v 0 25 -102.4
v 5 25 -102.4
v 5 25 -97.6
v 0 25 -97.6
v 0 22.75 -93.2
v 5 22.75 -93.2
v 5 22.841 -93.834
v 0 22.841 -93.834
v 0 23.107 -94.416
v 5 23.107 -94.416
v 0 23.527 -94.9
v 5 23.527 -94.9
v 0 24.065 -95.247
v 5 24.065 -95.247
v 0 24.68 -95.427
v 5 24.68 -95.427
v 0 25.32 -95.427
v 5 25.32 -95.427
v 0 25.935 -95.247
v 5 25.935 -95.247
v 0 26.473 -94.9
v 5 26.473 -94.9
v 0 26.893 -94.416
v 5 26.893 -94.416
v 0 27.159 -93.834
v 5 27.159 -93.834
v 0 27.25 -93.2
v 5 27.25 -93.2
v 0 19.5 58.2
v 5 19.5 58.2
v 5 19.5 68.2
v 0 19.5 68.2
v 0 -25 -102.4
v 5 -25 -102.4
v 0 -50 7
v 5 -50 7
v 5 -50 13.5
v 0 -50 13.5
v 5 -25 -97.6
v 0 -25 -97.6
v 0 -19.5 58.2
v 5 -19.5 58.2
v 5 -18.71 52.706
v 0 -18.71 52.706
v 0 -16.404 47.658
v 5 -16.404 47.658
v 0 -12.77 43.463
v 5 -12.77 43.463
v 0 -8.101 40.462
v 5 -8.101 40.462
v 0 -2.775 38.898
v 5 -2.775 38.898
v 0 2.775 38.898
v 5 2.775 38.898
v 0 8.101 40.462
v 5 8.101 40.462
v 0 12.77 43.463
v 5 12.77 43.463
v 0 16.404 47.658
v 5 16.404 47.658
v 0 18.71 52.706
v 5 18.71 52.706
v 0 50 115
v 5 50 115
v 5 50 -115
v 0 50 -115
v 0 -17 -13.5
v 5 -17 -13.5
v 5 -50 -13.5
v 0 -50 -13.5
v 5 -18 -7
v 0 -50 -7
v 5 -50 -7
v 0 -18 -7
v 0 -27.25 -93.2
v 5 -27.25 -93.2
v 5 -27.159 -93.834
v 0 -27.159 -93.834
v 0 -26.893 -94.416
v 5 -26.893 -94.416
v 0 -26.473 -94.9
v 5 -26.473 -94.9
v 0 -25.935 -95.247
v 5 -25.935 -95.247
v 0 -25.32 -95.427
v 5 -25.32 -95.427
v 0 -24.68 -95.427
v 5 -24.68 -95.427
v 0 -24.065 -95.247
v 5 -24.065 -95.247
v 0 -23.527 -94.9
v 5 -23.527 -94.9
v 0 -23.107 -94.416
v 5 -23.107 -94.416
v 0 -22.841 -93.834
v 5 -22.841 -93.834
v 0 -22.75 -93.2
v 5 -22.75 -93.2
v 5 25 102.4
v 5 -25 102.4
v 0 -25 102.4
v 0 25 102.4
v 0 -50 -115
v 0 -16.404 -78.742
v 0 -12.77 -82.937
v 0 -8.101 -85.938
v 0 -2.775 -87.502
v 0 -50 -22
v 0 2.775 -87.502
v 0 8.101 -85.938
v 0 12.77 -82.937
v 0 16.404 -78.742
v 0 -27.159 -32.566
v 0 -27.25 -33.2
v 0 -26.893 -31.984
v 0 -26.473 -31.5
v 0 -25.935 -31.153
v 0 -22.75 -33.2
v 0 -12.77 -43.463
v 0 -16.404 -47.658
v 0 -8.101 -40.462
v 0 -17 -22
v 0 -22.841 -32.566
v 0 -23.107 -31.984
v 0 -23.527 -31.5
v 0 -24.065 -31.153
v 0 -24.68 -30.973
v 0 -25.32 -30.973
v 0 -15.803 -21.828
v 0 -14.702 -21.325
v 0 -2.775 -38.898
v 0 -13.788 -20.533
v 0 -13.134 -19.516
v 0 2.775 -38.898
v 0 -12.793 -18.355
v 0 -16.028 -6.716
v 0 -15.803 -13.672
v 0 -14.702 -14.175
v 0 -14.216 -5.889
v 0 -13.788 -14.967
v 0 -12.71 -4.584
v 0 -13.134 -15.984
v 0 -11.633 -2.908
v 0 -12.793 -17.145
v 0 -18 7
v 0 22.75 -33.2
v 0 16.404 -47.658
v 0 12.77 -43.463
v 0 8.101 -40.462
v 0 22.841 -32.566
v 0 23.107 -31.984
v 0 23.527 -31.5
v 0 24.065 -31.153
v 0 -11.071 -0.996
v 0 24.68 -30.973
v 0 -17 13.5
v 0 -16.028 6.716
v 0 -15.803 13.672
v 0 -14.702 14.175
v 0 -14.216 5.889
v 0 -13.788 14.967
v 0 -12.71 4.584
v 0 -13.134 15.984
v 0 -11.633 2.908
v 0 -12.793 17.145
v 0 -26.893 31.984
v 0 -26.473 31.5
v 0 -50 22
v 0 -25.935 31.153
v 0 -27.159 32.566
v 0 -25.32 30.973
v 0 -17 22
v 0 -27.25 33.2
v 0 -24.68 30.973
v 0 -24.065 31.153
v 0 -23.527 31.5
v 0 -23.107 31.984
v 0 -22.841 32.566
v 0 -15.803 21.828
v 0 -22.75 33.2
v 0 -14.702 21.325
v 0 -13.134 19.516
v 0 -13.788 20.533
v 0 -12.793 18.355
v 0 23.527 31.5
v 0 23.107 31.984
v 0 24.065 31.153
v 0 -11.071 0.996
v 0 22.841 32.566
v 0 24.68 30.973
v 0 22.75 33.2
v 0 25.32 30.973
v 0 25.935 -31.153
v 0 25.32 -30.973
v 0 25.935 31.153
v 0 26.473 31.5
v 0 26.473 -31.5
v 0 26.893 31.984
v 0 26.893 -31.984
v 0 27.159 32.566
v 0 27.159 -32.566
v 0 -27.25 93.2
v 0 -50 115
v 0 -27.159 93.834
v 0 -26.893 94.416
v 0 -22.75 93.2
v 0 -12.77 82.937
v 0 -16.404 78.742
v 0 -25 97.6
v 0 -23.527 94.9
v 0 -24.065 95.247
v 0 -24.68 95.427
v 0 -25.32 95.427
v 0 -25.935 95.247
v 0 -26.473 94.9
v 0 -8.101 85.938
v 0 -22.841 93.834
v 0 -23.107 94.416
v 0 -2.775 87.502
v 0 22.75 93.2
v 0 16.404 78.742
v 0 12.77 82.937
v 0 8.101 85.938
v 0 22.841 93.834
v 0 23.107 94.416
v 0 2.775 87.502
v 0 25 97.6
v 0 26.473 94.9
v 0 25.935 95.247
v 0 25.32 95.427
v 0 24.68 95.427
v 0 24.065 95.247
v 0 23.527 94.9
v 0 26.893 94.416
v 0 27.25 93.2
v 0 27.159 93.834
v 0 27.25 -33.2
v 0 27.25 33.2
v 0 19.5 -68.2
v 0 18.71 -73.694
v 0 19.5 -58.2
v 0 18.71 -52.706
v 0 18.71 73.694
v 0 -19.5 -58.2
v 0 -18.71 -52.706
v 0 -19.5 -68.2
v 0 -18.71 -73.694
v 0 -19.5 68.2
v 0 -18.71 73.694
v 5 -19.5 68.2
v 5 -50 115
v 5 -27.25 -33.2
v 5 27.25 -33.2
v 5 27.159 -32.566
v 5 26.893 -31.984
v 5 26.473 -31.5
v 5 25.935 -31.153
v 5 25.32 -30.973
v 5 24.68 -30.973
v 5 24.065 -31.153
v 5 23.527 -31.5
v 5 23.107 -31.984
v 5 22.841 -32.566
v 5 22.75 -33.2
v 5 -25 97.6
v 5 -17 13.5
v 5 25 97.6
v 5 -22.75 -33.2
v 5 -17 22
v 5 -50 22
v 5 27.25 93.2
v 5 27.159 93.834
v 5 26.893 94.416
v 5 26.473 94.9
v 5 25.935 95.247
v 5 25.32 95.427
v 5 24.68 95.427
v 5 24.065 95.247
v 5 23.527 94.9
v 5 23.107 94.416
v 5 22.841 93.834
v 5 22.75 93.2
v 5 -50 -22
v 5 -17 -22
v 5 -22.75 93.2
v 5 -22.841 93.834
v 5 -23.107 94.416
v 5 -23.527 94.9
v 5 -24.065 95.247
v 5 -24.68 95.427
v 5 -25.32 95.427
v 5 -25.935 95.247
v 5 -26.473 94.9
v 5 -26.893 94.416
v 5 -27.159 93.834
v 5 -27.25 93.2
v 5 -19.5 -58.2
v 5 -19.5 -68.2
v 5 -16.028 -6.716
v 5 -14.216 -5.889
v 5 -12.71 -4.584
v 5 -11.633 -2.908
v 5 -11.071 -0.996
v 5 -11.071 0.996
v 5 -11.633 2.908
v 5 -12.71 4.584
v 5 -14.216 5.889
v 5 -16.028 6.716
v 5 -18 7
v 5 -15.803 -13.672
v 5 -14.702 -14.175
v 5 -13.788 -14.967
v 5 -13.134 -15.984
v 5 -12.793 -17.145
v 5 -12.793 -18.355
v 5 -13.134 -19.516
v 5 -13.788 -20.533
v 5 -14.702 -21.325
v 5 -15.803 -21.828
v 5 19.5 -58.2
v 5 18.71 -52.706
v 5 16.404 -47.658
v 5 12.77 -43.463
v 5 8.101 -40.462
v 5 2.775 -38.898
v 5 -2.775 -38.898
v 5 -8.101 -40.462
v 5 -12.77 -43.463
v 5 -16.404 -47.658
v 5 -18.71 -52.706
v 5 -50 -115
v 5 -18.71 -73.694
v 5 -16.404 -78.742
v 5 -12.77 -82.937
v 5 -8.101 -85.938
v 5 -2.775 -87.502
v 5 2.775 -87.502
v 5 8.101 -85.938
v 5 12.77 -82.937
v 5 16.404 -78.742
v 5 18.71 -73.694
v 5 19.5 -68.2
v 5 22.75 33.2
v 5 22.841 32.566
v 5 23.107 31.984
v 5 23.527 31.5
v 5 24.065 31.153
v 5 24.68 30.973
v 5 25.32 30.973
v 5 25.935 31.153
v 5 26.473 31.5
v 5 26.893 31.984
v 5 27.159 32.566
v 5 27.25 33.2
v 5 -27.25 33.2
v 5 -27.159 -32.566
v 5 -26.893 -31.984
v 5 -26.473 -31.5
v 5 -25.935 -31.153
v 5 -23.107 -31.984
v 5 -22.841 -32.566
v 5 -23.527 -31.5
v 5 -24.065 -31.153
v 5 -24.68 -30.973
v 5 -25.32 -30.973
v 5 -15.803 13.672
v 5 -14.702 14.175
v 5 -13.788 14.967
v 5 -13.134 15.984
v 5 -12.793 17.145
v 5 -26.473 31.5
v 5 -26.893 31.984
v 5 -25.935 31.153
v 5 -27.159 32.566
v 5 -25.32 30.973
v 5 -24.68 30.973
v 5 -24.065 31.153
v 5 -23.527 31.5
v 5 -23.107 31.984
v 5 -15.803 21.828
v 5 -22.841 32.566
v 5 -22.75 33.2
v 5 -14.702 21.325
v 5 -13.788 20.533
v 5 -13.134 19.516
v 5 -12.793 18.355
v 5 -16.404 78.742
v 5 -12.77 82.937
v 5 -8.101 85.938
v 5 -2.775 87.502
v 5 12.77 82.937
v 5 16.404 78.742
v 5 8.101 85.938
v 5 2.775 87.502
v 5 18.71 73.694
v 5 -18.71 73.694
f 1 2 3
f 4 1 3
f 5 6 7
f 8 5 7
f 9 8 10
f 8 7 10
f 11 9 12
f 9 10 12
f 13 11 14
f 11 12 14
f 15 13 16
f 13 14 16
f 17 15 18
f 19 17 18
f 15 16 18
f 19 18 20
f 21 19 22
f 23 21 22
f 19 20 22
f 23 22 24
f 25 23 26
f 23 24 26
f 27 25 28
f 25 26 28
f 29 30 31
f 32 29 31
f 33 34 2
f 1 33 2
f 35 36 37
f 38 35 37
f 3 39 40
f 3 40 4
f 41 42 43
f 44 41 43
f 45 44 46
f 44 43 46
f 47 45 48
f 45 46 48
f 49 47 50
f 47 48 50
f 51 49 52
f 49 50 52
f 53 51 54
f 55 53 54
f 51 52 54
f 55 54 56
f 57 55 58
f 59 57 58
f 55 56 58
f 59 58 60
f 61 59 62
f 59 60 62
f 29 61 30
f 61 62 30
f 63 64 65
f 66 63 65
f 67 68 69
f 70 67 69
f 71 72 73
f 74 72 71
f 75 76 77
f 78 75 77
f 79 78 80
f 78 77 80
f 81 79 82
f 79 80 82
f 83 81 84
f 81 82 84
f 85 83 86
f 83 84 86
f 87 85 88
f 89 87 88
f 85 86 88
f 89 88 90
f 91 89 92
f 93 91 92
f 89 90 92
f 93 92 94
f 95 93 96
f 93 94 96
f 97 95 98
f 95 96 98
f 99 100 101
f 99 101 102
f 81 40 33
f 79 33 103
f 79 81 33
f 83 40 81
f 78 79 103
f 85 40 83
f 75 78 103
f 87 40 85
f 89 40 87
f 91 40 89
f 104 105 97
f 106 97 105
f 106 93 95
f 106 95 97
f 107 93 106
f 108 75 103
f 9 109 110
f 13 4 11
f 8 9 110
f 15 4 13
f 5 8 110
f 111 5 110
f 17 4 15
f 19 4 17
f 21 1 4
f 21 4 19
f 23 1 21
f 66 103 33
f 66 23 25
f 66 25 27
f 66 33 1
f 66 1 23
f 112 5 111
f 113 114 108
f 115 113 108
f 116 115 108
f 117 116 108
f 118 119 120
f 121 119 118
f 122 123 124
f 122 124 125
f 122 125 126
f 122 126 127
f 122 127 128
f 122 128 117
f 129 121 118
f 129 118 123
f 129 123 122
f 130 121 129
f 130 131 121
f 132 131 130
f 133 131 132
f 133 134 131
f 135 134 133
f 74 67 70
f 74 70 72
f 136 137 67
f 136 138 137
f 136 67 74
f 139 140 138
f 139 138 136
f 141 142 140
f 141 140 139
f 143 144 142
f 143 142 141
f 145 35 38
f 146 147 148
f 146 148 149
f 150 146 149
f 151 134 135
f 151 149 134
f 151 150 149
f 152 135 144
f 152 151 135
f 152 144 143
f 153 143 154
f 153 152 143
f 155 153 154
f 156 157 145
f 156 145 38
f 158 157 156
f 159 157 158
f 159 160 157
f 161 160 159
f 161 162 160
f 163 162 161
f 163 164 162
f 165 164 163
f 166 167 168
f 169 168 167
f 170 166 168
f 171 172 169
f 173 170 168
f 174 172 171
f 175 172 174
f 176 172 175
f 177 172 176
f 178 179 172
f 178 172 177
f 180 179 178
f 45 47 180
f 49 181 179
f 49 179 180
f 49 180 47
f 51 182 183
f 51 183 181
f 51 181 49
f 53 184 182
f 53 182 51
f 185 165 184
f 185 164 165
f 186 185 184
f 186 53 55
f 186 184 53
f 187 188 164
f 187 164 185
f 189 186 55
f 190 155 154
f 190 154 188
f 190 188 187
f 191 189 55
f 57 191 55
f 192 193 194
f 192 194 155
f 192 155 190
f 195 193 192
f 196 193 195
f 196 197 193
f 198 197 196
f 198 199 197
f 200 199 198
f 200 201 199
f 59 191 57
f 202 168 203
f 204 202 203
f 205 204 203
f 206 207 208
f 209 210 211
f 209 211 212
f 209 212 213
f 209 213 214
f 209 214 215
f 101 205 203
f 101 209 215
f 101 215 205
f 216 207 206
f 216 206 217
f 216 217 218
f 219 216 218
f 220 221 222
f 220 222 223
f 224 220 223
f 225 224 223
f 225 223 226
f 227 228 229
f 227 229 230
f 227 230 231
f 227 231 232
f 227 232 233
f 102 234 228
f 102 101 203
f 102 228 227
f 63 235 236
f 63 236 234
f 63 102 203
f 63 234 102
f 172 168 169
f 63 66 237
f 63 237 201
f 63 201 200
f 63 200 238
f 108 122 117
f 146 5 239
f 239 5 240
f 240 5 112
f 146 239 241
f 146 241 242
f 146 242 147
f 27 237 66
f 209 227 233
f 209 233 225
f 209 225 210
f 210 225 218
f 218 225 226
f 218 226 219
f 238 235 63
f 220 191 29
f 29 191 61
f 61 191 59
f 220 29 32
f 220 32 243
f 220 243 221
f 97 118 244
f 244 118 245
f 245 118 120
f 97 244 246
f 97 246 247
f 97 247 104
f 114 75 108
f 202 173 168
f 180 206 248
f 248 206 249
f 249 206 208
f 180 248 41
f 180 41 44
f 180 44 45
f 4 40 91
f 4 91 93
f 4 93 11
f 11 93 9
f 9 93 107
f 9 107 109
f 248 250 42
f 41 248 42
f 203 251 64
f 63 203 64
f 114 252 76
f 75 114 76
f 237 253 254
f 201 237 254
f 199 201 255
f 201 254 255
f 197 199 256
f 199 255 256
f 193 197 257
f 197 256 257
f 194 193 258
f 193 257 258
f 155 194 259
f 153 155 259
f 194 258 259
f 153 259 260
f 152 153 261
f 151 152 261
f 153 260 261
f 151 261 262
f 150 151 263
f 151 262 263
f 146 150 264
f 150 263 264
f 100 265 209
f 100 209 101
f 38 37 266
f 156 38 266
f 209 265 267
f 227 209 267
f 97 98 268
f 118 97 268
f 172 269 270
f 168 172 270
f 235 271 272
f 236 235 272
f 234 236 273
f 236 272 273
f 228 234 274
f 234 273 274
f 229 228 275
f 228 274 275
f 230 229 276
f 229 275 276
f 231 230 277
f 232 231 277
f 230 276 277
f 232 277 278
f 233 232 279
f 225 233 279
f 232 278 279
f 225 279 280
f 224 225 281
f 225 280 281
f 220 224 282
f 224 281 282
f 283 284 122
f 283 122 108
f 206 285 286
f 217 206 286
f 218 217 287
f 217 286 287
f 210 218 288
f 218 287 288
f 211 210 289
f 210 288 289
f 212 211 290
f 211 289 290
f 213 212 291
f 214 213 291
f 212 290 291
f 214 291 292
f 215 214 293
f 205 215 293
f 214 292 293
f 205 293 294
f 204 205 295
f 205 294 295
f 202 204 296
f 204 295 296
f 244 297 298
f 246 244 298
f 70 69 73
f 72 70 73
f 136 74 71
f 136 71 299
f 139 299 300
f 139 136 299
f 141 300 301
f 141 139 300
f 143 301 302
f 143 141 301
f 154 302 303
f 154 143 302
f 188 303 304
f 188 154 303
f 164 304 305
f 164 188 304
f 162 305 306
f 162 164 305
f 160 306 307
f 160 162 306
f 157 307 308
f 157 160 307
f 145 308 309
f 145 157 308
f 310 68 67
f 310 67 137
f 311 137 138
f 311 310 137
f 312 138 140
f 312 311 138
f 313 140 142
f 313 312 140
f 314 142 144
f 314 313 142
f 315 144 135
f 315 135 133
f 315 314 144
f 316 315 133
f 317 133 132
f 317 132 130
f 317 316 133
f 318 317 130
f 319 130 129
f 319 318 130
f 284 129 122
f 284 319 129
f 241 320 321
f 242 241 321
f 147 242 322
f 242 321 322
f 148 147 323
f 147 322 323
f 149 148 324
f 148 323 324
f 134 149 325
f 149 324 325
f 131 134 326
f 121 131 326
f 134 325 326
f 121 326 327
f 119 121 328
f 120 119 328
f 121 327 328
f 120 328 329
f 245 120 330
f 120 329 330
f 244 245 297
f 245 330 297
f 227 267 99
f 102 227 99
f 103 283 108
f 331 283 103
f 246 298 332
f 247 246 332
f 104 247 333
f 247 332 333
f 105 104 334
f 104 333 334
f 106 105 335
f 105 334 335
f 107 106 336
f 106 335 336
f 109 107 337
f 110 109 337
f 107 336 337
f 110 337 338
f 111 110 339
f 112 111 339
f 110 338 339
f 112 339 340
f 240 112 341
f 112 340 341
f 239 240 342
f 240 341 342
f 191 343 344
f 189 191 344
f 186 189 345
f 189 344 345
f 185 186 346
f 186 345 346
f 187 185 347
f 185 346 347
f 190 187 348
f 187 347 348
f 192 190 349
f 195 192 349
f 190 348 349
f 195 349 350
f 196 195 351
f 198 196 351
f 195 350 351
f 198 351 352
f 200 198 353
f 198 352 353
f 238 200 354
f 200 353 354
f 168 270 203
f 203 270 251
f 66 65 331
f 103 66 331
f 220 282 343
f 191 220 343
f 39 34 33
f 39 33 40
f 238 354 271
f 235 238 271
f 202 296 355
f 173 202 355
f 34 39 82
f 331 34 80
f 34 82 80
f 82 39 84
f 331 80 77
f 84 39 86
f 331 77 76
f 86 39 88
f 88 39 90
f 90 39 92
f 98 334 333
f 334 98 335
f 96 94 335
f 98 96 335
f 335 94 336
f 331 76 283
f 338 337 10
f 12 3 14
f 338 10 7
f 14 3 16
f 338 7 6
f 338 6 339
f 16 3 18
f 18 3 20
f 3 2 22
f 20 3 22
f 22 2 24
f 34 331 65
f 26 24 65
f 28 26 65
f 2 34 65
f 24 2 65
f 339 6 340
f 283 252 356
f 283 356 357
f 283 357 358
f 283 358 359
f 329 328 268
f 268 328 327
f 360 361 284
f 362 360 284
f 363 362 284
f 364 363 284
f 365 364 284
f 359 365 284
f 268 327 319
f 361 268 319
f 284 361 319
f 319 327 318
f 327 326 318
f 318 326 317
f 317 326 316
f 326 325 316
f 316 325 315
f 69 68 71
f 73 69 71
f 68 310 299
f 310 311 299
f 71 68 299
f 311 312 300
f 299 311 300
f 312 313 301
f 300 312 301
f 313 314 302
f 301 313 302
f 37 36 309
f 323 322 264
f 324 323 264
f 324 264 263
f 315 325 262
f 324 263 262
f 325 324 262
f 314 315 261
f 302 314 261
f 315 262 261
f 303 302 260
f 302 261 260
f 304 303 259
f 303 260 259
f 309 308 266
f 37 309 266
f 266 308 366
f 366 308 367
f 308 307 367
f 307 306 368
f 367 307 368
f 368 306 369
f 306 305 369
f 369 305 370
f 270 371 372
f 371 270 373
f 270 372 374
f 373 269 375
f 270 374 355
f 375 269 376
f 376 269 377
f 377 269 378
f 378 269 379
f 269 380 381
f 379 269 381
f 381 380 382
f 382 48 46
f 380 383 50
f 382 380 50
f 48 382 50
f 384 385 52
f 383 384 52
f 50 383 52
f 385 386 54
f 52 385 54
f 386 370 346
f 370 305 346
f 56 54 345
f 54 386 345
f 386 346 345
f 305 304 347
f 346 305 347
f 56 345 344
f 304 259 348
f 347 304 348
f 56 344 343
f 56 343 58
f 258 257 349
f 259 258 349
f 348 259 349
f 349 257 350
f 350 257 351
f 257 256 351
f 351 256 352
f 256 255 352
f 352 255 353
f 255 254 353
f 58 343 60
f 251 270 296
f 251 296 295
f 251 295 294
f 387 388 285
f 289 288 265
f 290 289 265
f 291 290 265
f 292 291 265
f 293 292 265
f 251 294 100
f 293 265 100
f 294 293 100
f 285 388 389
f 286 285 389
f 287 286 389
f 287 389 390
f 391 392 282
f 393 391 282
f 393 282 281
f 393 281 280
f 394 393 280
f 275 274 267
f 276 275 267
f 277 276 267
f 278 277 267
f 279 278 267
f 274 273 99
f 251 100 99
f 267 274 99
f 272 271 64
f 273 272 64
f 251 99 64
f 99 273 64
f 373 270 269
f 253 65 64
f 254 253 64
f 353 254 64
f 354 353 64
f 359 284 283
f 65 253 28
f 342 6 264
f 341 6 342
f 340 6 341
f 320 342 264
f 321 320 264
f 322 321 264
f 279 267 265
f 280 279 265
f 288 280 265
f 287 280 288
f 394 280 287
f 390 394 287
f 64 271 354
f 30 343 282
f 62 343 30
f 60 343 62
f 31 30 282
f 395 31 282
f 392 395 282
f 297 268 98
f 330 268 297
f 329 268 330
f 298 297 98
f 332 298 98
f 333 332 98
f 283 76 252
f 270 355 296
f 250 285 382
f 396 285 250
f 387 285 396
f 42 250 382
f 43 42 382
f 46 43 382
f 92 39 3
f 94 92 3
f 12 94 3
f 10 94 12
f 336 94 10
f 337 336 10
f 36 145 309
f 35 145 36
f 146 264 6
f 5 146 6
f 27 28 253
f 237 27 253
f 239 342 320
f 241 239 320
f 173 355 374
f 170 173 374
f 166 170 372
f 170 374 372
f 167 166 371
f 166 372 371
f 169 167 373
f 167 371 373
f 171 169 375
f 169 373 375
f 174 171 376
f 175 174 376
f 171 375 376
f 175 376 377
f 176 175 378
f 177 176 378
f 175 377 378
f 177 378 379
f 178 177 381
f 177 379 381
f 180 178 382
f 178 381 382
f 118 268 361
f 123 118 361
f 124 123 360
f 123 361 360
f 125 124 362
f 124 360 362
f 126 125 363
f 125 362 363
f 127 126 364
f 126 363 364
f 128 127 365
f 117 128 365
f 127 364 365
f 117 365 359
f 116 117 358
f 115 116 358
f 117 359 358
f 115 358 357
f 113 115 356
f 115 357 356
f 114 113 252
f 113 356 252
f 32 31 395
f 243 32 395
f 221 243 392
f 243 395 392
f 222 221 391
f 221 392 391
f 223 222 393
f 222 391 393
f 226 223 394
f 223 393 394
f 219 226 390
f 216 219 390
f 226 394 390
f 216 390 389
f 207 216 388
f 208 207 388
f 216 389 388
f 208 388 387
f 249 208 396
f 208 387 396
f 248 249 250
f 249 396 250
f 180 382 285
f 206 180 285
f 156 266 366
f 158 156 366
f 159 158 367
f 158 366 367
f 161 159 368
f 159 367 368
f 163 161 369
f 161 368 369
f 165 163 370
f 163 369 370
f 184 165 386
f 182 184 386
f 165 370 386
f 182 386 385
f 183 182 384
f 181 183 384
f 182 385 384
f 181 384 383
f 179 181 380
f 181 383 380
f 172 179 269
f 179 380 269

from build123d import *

# Parameters (mm, degrees)
CUT_EXTRUDE1_START     = -5
CUT_EXTRUDE1_OUTLINE_W = 4.8
CUT_EXTRUDE1_OUTLINE_H = 50
CUT_EXTRUDE1_DEPTH     = 5
BOSS_EXTRUDE1_START    = -5
BOSS_EXTRUDE1_DEPTH    = 5
BOSS_EXTRUDE2_START    = -5
BOSS_EXTRUDE2_DEPTH    = 5
CUT_EXTRUDE2_DEPTH     = 10
BOSS_EXTRUDE3_START    = -5
BOSS_EXTRUDE3_DEPTH    = 5
BOSS_EXTRUDE4_START    = -5
BOSS_EXTRUDE4_DEPTH    = 5


with BuildPart() as part:
    # Cut-Extrude1: read off the stored shape, not the designer's step
    # Cut-Extrude1 outline → Cut-Extrude1 (new body)
    with BuildSketch(Plane.ZY.offset(CUT_EXTRUDE1_START)):
        with BuildLine():
            Line((22, -25), (47, -50))
            Line((47, -50), (115, -50))
            Line((115, -50), (115, 50))
            Line((115, 50), (-115, 50))
            Line((-115, 50), (-115, -50))
            Line((-115, -50), (-47, -50))
            Line((-47, -50), (-22, -25))
            Line((-22, -25), (-22, 0))
            ThreePointArc((-22, 0), (-16.382917933, 14.683323874), (-2.4, 21.868699093))
            Line((-2.4, 21.868699093), (-2.4, 25))
            Line((-2.4, 25), (2.4, 25))
            Line((2.4, 25), (2.4, 21.868699093))
            ThreePointArc((2.4, 21.868699093), (16.382917933, 14.683323874), (22, 0))
            Line((22, 0), (22, -25))
        make_face()
        with BuildLine():
            ThreePointArc((-33.2, -22.75), (-30.95, -25), (-33.2, -27.25))
            Line((-33.2, -27.25), (-93.2, -27.25))
            ThreePointArc((-93.2, -27.25), (-95.45, -25), (-93.2, -22.75))
            Line((-93.2, -22.75), (-33.2, -22.75))
        make_face(mode=Mode.SUBTRACT)
        with BuildLine():
            ThreePointArc((33.2, -27.25), (30.95, -25), (33.2, -22.75))
            Line((33.2, -22.75), (93.2, -22.75))
            ThreePointArc((93.2, -22.75), (95.45, -25), (93.2, -27.25))
            Line((93.2, -27.25), (33.2, -27.25))
        make_face(mode=Mode.SUBTRACT)
        with Locations((-100, 0)):
            Rectangle(CUT_EXTRUDE1_OUTLINE_W, CUT_EXTRUDE1_OUTLINE_H, mode=Mode.SUBTRACT)
        with BuildLine():
            ThreePointArc((-58.2, 19.5), (-38.7, 0), (-58.2, -19.5))
            Line((-58.2, -19.5), (-68.2, -19.5))
            ThreePointArc((-68.2, -19.5), (-87.7, 0), (-68.2, 19.5))
            Line((-68.2, 19.5), (-58.2, 19.5))
        make_face(mode=Mode.SUBTRACT)
        with BuildLine():
            ThreePointArc((-33.2, 27.25), (-30.95, 25), (-33.2, 22.75))
            Line((-33.2, 22.75), (-93.2, 22.75))
            ThreePointArc((-93.2, 22.75), (-95.45, 25), (-93.2, 27.25))
            Line((-93.2, 27.25), (-33.2, 27.25))
        make_face(mode=Mode.SUBTRACT)
        with BuildLine():
            ThreePointArc((58.2, -19.5), (38.7, 0), (58.2, 19.5))
            Line((58.2, 19.5), (68.2, 19.5))
            ThreePointArc((68.2, 19.5), (87.7, 0), (68.2, -19.5))
            Line((68.2, -19.5), (58.2, -19.5))
        make_face(mode=Mode.SUBTRACT)
        with Locations((100, 0)):
            Rectangle(CUT_EXTRUDE1_OUTLINE_W, CUT_EXTRUDE1_OUTLINE_H, mode=Mode.SUBTRACT)
        with BuildLine():
            ThreePointArc((33.2, 22.75), (30.95, 25), (33.2, 27.25))
            Line((33.2, 27.25), (93.2, 27.25))
            ThreePointArc((93.2, 27.25), (95.45, 25), (93.2, 22.75))
            Line((93.2, 22.75), (33.2, 22.75))
        make_face(mode=Mode.SUBTRACT)
    extrude(amount=CUT_EXTRUDE1_DEPTH)

    # Sketch2 → Boss-Extrude1 (add)
    with BuildSketch(Plane.ZY.offset(BOSS_EXTRUDE1_START)):
        with BuildLine():
            Line((2.4, 25), (-2.4, 25))
            Line((-2.4, 25), (-2.4, 21.868699093))
            ThreePointArc((-2.4, 21.868699093), (0, 22), (2.4, 21.868699093))
            Line((2.4, 21.868699093), (2.4, 25))
        make_face()
    extrude(amount=BOSS_EXTRUDE1_DEPTH)

    # Sketch3 → Boss-Extrude2 (add)
    with BuildSketch(Plane.ZY.offset(BOSS_EXTRUDE2_START)):
        with BuildLine():
            Line((13.5, -50), (13.5, 17.370952766))
            ThreePointArc((13.5, 17.370952766), (0, 22), (-13.5, 17.370952766))
            Line((-13.5, 17.370952766), (-13.5, -50))
            Line((-13.5, -50), (13.5, -50))
        make_face()
    extrude(amount=BOSS_EXTRUDE2_DEPTH)

    # Sketch4 → Cut-Extrude2 (cut)
    with BuildSketch(Plane.ZY):
        with BuildLine():
            Line((7, -18), (7, -50))
            ThreePointArc((7, -50), (0, -57), (-7, -50))
            Line((-7, -50), (-7, -18))
            ThreePointArc((-7, -18), (0, -11), (7, -18))
        make_face()
    extrude(amount=-CUT_EXTRUDE2_DEPTH, mode=Mode.SUBTRACT)

    # Sketch5 → Boss-Extrude3 (add)
    with BuildSketch(Plane.ZY.offset(BOSS_EXTRUDE3_START)):
        Polygon((-22, -25), (-22, -50), (-47, -50), align=None)
        with BuildLine():
            Line((-13.5, 17.370952766), (-13.5, 0))
            ThreePointArc((-13.5, 0), (-17.75, 4.25), (-22, 0))
            ThreePointArc((-22, 0), (-19.761072845, 9.669539803), (-13.5, 17.370952766))
        make_face()
    boss_extrude3 = extrude(amount=BOSS_EXTRUDE3_DEPTH)

    # Sketch6 → Boss-Extrude4 (add)
    with BuildSketch(Plane.ZY.offset(BOSS_EXTRUDE4_START)):
        with BuildLine():
            Line((-13.5, 0), (-13.5, -17))
            ThreePointArc((-13.5, -17), (-17.75, -12.75), (-22, -17))
            Line((-22, -17), (-22, 0))
            ThreePointArc((-22, 0), (-17.75, 4.25), (-13.5, 0))
        make_face()
    boss_extrude4 = extrude(amount=BOSS_EXTRUDE4_DEPTH)

    # Mirror1: Boss-Extrude3, Boss-Extrude4 across plane
    add(boss_extrude3.mirror(Plane.XY))
    add(boss_extrude4.mirror(Plane.XY))


solid = part.part
